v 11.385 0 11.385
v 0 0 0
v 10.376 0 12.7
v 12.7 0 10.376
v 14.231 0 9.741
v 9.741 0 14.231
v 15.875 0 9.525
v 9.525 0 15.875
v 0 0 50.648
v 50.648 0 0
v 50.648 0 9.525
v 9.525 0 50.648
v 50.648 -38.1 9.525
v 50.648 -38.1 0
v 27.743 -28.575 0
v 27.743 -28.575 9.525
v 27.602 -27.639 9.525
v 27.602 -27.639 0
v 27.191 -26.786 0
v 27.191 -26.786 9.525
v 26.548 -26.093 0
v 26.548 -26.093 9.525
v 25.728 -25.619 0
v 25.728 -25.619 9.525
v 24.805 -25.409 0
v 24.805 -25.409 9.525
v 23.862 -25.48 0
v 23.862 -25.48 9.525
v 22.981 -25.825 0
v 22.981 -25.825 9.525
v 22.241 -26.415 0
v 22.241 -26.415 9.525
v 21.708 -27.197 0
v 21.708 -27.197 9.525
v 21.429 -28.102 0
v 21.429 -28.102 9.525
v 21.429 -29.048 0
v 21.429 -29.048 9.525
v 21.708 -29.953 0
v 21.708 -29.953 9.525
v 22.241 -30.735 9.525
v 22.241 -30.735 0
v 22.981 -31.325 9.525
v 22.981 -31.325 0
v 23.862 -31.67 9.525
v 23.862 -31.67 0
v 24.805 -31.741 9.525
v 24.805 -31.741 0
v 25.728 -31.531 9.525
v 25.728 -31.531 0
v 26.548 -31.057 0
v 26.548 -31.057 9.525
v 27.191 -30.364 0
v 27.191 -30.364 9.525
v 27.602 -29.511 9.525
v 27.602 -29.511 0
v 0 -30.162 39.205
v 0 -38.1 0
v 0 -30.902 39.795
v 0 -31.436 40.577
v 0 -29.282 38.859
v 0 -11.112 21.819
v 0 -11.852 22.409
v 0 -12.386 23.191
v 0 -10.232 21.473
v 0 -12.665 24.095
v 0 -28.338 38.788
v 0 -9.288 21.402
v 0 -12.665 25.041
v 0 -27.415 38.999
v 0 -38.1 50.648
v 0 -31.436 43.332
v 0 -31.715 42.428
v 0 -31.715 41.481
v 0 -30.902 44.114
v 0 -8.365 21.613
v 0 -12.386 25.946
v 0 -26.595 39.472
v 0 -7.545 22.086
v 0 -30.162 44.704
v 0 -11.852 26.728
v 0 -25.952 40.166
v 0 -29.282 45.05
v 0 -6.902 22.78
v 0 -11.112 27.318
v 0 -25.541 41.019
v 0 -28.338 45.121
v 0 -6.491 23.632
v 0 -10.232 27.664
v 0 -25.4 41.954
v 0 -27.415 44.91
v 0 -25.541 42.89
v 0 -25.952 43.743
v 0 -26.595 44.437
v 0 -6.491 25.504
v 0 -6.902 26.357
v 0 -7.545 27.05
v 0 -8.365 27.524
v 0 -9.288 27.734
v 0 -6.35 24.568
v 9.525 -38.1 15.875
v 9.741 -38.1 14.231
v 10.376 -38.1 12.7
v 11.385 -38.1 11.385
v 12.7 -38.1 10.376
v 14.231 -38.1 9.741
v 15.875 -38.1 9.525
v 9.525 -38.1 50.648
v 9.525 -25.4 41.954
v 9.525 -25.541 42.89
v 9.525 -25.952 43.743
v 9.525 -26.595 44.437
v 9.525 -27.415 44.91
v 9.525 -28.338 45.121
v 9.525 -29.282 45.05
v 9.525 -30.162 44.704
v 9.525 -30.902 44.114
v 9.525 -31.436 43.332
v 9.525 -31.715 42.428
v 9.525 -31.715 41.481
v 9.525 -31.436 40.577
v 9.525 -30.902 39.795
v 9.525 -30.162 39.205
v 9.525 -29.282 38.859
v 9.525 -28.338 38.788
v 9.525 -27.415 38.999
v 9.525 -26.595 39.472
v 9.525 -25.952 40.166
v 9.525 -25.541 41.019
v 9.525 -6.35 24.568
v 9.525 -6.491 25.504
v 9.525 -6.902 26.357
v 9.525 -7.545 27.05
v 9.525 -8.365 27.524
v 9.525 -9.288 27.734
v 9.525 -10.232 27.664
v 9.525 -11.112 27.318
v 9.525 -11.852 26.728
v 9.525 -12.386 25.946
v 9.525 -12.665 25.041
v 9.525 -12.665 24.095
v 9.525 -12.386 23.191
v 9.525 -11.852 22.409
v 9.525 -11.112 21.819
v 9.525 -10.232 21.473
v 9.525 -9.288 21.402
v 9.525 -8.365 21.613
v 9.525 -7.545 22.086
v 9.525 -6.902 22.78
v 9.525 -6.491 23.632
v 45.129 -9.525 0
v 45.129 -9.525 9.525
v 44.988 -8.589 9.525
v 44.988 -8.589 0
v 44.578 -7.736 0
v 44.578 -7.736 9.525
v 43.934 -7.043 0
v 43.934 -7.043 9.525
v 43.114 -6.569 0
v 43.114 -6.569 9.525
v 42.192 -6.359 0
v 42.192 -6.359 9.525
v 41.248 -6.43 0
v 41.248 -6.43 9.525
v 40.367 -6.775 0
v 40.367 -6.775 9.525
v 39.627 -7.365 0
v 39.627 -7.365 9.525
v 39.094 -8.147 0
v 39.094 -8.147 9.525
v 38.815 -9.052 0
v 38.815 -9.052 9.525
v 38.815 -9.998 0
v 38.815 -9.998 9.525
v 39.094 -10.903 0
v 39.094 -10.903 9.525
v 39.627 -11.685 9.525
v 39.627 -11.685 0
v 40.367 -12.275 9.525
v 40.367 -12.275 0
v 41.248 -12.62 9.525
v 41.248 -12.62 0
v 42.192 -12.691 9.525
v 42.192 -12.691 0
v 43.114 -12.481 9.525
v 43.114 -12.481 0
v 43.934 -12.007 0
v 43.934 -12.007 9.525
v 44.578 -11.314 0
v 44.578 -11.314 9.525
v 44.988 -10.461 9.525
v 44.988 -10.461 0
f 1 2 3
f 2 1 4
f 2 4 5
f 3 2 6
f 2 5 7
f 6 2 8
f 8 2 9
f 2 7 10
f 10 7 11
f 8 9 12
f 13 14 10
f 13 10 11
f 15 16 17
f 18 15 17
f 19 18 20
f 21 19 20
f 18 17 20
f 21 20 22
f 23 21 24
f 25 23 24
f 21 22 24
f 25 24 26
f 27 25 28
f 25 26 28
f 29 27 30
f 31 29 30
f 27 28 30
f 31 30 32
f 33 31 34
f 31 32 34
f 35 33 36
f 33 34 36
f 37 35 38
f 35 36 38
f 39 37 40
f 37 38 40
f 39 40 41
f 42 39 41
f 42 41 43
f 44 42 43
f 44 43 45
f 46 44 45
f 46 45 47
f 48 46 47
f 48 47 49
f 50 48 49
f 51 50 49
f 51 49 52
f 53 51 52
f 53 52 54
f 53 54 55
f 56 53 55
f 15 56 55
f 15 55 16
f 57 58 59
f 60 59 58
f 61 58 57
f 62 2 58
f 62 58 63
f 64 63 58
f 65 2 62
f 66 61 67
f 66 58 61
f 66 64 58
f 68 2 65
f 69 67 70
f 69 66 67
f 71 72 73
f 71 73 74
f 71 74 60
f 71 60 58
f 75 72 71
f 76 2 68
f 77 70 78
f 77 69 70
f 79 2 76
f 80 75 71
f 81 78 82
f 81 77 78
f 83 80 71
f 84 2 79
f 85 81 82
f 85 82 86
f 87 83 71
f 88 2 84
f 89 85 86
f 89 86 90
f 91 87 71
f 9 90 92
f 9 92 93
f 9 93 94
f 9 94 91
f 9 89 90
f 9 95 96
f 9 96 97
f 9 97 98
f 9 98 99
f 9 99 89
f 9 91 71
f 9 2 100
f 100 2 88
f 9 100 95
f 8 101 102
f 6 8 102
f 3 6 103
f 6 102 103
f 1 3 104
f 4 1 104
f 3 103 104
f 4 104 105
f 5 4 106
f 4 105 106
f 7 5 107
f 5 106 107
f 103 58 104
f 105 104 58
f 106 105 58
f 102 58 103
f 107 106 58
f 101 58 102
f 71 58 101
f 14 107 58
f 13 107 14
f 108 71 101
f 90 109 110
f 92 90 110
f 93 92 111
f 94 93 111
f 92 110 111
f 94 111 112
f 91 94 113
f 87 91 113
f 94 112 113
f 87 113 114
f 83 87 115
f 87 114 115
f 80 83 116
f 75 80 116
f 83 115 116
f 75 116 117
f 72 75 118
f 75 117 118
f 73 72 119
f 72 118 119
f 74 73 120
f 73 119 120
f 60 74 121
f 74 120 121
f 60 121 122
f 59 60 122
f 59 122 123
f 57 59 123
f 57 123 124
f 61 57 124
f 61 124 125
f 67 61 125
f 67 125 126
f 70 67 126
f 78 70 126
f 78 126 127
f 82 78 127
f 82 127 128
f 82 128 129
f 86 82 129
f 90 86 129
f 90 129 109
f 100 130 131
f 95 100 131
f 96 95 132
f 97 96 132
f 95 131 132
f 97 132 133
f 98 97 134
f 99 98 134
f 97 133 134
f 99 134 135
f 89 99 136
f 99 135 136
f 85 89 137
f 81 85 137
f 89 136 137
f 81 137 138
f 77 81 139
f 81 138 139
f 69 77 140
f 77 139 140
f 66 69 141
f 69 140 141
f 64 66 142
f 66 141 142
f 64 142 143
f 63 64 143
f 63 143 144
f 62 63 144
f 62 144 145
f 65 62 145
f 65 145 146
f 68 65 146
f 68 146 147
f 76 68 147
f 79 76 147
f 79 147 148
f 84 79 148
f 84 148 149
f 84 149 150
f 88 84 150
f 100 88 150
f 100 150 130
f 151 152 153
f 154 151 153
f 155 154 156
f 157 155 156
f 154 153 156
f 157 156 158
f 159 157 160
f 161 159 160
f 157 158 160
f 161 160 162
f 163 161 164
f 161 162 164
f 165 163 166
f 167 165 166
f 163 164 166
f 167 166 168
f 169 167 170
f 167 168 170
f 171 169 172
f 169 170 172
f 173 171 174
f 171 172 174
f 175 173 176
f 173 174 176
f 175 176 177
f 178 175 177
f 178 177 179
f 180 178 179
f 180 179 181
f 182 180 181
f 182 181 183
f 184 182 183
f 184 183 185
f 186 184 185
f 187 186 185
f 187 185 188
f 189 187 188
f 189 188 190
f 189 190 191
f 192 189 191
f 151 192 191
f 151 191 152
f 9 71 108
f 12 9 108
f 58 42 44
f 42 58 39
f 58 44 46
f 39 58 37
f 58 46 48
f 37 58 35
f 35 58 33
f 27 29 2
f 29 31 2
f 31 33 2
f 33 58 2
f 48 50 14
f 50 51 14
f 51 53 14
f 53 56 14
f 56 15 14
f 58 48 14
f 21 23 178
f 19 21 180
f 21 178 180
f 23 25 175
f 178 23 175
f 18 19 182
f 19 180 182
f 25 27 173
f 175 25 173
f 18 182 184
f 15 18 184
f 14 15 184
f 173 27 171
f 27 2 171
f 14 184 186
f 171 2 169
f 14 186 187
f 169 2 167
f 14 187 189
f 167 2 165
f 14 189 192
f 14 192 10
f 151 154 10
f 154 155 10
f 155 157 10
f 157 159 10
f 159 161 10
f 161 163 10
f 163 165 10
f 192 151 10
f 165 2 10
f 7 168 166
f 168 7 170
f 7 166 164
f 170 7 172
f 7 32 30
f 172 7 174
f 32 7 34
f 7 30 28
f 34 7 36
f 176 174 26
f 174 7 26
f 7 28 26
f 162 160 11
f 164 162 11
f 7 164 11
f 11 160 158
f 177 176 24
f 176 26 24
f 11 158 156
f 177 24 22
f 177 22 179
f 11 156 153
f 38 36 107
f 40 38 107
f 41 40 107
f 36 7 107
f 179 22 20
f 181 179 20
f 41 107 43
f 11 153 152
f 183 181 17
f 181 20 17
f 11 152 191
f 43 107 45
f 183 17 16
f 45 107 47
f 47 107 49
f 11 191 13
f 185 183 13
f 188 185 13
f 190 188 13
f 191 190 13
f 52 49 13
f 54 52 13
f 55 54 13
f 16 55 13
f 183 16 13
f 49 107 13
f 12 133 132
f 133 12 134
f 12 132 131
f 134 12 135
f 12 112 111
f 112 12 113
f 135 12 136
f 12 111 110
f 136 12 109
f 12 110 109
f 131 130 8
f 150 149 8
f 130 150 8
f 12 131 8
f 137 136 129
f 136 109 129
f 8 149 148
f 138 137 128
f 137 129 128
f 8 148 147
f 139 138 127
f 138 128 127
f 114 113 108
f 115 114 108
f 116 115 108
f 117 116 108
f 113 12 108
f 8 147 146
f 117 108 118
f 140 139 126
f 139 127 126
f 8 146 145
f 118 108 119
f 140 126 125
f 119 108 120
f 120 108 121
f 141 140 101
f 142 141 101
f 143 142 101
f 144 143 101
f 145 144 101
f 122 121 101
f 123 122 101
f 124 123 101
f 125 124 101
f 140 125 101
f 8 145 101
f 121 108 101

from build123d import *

# Parameters (mm, degrees)
F0_W     = 50.6476
F0_H     = 50.6476
F1_DEPTH = 38.1
F3_DEPTH = 38.101
F4_R     = 3.175
F5_DEPTH = 9.526
F6_R     = 3.175
F7_DEPTH = 9.526


with BuildPart() as f1:
    # F0 (on Front) → F1 (new body)
    with BuildSketch(Plane.XZ):
        with Locations((25.3238, 25.3238)):
            Rectangle(F0_W, F0_H)
    extrude(amount=F1_DEPTH)

    # F2 (on face) → F3 (cut, through all)
    with BuildSketch(Plane.XZ.offset(38.1)):
        with BuildLine():
            Line((50.6476, 9.525), (50.6476, 50.6476))
            Line((50.6476, 50.6476), (9.525, 50.6476))
            Line((9.525, 50.6476), (9.525, 15.875))
            ThreePointArc((9.525, 15.875), (11.384872, 11.384872), (15.875, 9.525))
            Line((15.875, 9.525), (50.6476, 9.525))
        make_face()
    extrude(amount=-F3_DEPTH, mode=Mode.SUBTRACT)

    # F4 (on face) → F5 (cut, through all)
    with BuildSketch(Plane.XY.offset(9.525)):
        with Locations((24.56815, -28.575)):
            Circle(F4_R)
        with Locations((41.95445, -9.525)):
            Circle(F4_R)
    extrude(amount=-F5_DEPTH, mode=Mode.SUBTRACT)

    # F6 (on face) → F7 (cut, through all)
    with BuildSketch(Plane.YZ.offset(9.525)):
        with Locations((-28.575, 41.95445)):
            Circle(F6_R)
        with Locations((-9.525, 24.56815)):
            Circle(F6_R)
    extrude(amount=-F7_DEPTH, mode=Mode.SUBTRACT)


solid = f1.part
